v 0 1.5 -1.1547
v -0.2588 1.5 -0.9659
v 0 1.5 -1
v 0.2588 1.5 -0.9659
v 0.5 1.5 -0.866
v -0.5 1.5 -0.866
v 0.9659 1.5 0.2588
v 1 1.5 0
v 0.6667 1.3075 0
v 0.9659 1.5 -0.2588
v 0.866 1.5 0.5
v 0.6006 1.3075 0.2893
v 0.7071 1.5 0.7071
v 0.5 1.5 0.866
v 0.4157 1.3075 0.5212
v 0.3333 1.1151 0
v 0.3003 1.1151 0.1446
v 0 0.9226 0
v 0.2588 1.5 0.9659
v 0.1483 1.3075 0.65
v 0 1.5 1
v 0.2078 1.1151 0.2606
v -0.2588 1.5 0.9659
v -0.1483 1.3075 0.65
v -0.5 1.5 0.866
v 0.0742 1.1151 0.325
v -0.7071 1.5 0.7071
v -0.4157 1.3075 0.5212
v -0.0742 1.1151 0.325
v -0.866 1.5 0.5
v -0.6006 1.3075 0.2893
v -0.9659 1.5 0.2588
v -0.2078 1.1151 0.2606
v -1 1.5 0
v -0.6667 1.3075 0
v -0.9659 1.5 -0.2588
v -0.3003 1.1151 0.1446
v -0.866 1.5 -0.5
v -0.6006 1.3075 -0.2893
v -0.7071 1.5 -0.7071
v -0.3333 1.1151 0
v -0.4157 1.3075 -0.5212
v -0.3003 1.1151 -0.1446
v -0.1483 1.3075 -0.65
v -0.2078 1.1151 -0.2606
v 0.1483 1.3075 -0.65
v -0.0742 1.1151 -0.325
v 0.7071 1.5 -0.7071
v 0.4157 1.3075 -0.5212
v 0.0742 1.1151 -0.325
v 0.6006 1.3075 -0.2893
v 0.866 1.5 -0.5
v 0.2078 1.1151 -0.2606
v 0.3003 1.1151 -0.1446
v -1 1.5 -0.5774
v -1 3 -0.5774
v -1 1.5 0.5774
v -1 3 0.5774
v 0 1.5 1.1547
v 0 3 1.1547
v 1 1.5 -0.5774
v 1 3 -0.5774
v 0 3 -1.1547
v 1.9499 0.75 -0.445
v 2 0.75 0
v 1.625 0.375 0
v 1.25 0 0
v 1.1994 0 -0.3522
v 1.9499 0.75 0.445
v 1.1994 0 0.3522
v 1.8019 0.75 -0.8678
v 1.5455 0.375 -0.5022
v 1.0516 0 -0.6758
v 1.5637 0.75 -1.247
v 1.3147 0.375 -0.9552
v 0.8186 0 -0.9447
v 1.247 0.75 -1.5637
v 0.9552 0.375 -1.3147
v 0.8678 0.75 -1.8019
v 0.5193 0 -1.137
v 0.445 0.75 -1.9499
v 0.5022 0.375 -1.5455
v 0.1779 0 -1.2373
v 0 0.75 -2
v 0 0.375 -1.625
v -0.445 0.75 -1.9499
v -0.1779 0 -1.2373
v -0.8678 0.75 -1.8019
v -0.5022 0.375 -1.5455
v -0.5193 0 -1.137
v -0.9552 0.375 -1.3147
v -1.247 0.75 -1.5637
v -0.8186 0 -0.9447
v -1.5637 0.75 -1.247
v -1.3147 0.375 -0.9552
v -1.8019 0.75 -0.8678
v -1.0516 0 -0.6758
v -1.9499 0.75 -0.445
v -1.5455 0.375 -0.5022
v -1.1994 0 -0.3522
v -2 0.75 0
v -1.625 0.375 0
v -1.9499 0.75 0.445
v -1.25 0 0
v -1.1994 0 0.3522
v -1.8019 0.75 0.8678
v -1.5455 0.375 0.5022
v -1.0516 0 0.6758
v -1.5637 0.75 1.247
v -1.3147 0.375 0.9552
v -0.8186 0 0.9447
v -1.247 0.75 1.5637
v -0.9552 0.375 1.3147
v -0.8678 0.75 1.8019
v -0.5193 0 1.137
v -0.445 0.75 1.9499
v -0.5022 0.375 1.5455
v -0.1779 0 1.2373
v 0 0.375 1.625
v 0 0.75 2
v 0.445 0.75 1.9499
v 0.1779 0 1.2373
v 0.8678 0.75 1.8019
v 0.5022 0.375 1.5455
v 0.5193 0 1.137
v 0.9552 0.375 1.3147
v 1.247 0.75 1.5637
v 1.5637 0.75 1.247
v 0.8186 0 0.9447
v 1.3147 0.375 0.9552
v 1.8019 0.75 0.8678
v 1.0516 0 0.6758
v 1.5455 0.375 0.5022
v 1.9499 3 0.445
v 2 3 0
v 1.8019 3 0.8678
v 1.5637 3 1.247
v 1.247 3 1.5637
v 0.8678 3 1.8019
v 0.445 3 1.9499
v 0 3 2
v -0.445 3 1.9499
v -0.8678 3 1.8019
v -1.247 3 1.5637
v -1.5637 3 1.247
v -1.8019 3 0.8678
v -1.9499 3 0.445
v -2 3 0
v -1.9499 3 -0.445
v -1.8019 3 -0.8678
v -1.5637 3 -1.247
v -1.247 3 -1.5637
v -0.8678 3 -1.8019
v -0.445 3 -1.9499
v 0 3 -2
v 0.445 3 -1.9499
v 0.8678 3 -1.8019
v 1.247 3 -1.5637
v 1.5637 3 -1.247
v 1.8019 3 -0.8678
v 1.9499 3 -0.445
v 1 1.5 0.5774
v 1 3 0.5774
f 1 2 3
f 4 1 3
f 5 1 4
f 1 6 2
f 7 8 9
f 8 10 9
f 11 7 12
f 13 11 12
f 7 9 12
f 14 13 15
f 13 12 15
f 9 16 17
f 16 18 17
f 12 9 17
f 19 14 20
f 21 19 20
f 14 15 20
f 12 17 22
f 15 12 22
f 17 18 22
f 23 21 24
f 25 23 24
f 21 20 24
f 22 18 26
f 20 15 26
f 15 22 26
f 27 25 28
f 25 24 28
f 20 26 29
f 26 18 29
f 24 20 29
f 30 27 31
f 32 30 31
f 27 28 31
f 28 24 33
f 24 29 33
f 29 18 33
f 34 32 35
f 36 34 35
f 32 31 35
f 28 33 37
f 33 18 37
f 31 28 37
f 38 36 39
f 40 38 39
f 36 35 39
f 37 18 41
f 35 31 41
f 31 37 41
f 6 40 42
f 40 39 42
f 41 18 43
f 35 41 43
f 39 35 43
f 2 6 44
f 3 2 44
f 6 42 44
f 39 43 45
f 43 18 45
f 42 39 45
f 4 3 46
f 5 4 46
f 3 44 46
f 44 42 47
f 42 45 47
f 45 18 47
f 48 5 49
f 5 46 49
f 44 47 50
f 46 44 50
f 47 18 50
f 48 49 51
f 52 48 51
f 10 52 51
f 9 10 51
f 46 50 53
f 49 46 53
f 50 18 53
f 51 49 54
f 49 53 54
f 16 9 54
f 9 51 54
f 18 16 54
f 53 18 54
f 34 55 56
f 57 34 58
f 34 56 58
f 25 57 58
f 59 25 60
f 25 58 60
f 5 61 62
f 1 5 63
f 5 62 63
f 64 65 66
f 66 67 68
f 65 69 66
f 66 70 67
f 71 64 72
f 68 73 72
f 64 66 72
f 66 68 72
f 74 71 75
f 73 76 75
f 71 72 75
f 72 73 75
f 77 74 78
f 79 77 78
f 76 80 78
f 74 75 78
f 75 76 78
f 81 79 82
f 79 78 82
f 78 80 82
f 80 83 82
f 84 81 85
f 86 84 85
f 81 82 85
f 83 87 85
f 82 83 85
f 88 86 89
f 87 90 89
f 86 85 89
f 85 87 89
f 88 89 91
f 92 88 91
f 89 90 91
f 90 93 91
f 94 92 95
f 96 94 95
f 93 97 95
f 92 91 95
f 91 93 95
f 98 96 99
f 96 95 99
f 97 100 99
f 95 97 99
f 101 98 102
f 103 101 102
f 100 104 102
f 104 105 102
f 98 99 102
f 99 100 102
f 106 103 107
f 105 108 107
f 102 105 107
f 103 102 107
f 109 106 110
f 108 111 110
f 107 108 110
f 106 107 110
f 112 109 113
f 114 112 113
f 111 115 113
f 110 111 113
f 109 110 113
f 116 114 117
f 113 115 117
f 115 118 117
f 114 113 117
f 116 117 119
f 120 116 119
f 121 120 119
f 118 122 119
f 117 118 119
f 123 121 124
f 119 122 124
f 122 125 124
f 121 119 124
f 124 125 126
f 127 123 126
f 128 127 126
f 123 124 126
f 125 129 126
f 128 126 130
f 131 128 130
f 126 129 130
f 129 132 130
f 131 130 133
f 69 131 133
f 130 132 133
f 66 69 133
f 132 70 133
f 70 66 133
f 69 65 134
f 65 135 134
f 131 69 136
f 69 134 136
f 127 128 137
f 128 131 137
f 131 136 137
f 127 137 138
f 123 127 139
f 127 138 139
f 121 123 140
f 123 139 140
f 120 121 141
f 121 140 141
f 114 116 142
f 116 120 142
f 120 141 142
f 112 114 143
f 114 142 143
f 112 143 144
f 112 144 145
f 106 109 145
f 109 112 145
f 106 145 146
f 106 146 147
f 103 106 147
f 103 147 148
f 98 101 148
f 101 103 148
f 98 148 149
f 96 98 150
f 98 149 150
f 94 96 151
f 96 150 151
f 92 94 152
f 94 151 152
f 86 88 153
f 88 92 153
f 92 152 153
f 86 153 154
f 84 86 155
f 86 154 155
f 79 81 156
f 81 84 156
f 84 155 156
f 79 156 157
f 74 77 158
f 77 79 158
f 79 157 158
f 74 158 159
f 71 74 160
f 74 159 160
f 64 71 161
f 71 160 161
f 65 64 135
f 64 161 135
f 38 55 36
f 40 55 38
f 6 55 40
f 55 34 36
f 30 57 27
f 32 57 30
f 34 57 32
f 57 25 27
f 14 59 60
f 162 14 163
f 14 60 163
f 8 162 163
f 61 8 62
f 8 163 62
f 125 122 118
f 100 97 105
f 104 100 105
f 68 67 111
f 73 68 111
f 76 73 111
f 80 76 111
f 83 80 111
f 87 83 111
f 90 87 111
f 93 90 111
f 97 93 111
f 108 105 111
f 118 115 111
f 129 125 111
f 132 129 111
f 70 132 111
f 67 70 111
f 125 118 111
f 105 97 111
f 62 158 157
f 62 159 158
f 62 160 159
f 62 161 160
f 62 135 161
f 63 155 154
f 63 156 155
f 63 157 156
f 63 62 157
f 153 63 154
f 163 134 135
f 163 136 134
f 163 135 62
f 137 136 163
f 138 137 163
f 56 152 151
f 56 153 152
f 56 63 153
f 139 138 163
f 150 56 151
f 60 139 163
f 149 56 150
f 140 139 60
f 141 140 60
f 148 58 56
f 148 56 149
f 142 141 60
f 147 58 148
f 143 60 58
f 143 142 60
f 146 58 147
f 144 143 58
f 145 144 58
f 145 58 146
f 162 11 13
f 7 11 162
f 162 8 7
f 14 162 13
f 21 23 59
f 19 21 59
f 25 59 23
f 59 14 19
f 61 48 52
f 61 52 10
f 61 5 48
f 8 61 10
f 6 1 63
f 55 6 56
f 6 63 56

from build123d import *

# Parameters (mm, degrees)
SKETCH1_W          = 2
SKETCH1_H          = 3
CUT_EXTRUDE1_DEPTH = 1.5


with BuildPart() as part:
    # Sketch1 → Revolve1 (revolve)
    with BuildSketch(Plane.XY):
        with Locations((1, 1.5)):
            Rectangle(SKETCH1_W, SKETCH1_H)
    revolve(axis=Axis((0, 3, 0), (0, -1, 0)))

    # Sketch2 → Cut-Revolve1 (revolve, cut)
    with BuildSketch(Plane.XY):
        Polygon((0, 3), (1, 3), (1, 1.5), (0, 0.922649731), align=None)
    revolve(axis=Axis((0, 3, 0), (0, -1, 0)), mode=Mode.SUBTRACT)

    # Sketch3 → Cut-Extrude1 (cut)
    with BuildSketch(Plane(origin=(0, 3, 0), x_dir=(1, 0, 0), z_dir=(0, 1, 0))):
        Polygon((0, 1.154700538), (-1, 0.577350269), (-1, -0.577350269), (0, -1.154700538), (1, -0.577350269), (1, 0.577350269), align=None)
    extrude(amount=-CUT_EXTRUDE1_DEPTH, mode=Mode.SUBTRACT)

    # Sketch4 → Cut-Revolve2 (revolve, cut)
    with BuildSketch(Plane.XY):
        Polygon((1.25, 0), (2, 0), (2, 0.75), align=None)
    revolve(axis=Axis((0, 0, 0), (0, 1, 0)), mode=Mode.SUBTRACT)


solid = part.part
